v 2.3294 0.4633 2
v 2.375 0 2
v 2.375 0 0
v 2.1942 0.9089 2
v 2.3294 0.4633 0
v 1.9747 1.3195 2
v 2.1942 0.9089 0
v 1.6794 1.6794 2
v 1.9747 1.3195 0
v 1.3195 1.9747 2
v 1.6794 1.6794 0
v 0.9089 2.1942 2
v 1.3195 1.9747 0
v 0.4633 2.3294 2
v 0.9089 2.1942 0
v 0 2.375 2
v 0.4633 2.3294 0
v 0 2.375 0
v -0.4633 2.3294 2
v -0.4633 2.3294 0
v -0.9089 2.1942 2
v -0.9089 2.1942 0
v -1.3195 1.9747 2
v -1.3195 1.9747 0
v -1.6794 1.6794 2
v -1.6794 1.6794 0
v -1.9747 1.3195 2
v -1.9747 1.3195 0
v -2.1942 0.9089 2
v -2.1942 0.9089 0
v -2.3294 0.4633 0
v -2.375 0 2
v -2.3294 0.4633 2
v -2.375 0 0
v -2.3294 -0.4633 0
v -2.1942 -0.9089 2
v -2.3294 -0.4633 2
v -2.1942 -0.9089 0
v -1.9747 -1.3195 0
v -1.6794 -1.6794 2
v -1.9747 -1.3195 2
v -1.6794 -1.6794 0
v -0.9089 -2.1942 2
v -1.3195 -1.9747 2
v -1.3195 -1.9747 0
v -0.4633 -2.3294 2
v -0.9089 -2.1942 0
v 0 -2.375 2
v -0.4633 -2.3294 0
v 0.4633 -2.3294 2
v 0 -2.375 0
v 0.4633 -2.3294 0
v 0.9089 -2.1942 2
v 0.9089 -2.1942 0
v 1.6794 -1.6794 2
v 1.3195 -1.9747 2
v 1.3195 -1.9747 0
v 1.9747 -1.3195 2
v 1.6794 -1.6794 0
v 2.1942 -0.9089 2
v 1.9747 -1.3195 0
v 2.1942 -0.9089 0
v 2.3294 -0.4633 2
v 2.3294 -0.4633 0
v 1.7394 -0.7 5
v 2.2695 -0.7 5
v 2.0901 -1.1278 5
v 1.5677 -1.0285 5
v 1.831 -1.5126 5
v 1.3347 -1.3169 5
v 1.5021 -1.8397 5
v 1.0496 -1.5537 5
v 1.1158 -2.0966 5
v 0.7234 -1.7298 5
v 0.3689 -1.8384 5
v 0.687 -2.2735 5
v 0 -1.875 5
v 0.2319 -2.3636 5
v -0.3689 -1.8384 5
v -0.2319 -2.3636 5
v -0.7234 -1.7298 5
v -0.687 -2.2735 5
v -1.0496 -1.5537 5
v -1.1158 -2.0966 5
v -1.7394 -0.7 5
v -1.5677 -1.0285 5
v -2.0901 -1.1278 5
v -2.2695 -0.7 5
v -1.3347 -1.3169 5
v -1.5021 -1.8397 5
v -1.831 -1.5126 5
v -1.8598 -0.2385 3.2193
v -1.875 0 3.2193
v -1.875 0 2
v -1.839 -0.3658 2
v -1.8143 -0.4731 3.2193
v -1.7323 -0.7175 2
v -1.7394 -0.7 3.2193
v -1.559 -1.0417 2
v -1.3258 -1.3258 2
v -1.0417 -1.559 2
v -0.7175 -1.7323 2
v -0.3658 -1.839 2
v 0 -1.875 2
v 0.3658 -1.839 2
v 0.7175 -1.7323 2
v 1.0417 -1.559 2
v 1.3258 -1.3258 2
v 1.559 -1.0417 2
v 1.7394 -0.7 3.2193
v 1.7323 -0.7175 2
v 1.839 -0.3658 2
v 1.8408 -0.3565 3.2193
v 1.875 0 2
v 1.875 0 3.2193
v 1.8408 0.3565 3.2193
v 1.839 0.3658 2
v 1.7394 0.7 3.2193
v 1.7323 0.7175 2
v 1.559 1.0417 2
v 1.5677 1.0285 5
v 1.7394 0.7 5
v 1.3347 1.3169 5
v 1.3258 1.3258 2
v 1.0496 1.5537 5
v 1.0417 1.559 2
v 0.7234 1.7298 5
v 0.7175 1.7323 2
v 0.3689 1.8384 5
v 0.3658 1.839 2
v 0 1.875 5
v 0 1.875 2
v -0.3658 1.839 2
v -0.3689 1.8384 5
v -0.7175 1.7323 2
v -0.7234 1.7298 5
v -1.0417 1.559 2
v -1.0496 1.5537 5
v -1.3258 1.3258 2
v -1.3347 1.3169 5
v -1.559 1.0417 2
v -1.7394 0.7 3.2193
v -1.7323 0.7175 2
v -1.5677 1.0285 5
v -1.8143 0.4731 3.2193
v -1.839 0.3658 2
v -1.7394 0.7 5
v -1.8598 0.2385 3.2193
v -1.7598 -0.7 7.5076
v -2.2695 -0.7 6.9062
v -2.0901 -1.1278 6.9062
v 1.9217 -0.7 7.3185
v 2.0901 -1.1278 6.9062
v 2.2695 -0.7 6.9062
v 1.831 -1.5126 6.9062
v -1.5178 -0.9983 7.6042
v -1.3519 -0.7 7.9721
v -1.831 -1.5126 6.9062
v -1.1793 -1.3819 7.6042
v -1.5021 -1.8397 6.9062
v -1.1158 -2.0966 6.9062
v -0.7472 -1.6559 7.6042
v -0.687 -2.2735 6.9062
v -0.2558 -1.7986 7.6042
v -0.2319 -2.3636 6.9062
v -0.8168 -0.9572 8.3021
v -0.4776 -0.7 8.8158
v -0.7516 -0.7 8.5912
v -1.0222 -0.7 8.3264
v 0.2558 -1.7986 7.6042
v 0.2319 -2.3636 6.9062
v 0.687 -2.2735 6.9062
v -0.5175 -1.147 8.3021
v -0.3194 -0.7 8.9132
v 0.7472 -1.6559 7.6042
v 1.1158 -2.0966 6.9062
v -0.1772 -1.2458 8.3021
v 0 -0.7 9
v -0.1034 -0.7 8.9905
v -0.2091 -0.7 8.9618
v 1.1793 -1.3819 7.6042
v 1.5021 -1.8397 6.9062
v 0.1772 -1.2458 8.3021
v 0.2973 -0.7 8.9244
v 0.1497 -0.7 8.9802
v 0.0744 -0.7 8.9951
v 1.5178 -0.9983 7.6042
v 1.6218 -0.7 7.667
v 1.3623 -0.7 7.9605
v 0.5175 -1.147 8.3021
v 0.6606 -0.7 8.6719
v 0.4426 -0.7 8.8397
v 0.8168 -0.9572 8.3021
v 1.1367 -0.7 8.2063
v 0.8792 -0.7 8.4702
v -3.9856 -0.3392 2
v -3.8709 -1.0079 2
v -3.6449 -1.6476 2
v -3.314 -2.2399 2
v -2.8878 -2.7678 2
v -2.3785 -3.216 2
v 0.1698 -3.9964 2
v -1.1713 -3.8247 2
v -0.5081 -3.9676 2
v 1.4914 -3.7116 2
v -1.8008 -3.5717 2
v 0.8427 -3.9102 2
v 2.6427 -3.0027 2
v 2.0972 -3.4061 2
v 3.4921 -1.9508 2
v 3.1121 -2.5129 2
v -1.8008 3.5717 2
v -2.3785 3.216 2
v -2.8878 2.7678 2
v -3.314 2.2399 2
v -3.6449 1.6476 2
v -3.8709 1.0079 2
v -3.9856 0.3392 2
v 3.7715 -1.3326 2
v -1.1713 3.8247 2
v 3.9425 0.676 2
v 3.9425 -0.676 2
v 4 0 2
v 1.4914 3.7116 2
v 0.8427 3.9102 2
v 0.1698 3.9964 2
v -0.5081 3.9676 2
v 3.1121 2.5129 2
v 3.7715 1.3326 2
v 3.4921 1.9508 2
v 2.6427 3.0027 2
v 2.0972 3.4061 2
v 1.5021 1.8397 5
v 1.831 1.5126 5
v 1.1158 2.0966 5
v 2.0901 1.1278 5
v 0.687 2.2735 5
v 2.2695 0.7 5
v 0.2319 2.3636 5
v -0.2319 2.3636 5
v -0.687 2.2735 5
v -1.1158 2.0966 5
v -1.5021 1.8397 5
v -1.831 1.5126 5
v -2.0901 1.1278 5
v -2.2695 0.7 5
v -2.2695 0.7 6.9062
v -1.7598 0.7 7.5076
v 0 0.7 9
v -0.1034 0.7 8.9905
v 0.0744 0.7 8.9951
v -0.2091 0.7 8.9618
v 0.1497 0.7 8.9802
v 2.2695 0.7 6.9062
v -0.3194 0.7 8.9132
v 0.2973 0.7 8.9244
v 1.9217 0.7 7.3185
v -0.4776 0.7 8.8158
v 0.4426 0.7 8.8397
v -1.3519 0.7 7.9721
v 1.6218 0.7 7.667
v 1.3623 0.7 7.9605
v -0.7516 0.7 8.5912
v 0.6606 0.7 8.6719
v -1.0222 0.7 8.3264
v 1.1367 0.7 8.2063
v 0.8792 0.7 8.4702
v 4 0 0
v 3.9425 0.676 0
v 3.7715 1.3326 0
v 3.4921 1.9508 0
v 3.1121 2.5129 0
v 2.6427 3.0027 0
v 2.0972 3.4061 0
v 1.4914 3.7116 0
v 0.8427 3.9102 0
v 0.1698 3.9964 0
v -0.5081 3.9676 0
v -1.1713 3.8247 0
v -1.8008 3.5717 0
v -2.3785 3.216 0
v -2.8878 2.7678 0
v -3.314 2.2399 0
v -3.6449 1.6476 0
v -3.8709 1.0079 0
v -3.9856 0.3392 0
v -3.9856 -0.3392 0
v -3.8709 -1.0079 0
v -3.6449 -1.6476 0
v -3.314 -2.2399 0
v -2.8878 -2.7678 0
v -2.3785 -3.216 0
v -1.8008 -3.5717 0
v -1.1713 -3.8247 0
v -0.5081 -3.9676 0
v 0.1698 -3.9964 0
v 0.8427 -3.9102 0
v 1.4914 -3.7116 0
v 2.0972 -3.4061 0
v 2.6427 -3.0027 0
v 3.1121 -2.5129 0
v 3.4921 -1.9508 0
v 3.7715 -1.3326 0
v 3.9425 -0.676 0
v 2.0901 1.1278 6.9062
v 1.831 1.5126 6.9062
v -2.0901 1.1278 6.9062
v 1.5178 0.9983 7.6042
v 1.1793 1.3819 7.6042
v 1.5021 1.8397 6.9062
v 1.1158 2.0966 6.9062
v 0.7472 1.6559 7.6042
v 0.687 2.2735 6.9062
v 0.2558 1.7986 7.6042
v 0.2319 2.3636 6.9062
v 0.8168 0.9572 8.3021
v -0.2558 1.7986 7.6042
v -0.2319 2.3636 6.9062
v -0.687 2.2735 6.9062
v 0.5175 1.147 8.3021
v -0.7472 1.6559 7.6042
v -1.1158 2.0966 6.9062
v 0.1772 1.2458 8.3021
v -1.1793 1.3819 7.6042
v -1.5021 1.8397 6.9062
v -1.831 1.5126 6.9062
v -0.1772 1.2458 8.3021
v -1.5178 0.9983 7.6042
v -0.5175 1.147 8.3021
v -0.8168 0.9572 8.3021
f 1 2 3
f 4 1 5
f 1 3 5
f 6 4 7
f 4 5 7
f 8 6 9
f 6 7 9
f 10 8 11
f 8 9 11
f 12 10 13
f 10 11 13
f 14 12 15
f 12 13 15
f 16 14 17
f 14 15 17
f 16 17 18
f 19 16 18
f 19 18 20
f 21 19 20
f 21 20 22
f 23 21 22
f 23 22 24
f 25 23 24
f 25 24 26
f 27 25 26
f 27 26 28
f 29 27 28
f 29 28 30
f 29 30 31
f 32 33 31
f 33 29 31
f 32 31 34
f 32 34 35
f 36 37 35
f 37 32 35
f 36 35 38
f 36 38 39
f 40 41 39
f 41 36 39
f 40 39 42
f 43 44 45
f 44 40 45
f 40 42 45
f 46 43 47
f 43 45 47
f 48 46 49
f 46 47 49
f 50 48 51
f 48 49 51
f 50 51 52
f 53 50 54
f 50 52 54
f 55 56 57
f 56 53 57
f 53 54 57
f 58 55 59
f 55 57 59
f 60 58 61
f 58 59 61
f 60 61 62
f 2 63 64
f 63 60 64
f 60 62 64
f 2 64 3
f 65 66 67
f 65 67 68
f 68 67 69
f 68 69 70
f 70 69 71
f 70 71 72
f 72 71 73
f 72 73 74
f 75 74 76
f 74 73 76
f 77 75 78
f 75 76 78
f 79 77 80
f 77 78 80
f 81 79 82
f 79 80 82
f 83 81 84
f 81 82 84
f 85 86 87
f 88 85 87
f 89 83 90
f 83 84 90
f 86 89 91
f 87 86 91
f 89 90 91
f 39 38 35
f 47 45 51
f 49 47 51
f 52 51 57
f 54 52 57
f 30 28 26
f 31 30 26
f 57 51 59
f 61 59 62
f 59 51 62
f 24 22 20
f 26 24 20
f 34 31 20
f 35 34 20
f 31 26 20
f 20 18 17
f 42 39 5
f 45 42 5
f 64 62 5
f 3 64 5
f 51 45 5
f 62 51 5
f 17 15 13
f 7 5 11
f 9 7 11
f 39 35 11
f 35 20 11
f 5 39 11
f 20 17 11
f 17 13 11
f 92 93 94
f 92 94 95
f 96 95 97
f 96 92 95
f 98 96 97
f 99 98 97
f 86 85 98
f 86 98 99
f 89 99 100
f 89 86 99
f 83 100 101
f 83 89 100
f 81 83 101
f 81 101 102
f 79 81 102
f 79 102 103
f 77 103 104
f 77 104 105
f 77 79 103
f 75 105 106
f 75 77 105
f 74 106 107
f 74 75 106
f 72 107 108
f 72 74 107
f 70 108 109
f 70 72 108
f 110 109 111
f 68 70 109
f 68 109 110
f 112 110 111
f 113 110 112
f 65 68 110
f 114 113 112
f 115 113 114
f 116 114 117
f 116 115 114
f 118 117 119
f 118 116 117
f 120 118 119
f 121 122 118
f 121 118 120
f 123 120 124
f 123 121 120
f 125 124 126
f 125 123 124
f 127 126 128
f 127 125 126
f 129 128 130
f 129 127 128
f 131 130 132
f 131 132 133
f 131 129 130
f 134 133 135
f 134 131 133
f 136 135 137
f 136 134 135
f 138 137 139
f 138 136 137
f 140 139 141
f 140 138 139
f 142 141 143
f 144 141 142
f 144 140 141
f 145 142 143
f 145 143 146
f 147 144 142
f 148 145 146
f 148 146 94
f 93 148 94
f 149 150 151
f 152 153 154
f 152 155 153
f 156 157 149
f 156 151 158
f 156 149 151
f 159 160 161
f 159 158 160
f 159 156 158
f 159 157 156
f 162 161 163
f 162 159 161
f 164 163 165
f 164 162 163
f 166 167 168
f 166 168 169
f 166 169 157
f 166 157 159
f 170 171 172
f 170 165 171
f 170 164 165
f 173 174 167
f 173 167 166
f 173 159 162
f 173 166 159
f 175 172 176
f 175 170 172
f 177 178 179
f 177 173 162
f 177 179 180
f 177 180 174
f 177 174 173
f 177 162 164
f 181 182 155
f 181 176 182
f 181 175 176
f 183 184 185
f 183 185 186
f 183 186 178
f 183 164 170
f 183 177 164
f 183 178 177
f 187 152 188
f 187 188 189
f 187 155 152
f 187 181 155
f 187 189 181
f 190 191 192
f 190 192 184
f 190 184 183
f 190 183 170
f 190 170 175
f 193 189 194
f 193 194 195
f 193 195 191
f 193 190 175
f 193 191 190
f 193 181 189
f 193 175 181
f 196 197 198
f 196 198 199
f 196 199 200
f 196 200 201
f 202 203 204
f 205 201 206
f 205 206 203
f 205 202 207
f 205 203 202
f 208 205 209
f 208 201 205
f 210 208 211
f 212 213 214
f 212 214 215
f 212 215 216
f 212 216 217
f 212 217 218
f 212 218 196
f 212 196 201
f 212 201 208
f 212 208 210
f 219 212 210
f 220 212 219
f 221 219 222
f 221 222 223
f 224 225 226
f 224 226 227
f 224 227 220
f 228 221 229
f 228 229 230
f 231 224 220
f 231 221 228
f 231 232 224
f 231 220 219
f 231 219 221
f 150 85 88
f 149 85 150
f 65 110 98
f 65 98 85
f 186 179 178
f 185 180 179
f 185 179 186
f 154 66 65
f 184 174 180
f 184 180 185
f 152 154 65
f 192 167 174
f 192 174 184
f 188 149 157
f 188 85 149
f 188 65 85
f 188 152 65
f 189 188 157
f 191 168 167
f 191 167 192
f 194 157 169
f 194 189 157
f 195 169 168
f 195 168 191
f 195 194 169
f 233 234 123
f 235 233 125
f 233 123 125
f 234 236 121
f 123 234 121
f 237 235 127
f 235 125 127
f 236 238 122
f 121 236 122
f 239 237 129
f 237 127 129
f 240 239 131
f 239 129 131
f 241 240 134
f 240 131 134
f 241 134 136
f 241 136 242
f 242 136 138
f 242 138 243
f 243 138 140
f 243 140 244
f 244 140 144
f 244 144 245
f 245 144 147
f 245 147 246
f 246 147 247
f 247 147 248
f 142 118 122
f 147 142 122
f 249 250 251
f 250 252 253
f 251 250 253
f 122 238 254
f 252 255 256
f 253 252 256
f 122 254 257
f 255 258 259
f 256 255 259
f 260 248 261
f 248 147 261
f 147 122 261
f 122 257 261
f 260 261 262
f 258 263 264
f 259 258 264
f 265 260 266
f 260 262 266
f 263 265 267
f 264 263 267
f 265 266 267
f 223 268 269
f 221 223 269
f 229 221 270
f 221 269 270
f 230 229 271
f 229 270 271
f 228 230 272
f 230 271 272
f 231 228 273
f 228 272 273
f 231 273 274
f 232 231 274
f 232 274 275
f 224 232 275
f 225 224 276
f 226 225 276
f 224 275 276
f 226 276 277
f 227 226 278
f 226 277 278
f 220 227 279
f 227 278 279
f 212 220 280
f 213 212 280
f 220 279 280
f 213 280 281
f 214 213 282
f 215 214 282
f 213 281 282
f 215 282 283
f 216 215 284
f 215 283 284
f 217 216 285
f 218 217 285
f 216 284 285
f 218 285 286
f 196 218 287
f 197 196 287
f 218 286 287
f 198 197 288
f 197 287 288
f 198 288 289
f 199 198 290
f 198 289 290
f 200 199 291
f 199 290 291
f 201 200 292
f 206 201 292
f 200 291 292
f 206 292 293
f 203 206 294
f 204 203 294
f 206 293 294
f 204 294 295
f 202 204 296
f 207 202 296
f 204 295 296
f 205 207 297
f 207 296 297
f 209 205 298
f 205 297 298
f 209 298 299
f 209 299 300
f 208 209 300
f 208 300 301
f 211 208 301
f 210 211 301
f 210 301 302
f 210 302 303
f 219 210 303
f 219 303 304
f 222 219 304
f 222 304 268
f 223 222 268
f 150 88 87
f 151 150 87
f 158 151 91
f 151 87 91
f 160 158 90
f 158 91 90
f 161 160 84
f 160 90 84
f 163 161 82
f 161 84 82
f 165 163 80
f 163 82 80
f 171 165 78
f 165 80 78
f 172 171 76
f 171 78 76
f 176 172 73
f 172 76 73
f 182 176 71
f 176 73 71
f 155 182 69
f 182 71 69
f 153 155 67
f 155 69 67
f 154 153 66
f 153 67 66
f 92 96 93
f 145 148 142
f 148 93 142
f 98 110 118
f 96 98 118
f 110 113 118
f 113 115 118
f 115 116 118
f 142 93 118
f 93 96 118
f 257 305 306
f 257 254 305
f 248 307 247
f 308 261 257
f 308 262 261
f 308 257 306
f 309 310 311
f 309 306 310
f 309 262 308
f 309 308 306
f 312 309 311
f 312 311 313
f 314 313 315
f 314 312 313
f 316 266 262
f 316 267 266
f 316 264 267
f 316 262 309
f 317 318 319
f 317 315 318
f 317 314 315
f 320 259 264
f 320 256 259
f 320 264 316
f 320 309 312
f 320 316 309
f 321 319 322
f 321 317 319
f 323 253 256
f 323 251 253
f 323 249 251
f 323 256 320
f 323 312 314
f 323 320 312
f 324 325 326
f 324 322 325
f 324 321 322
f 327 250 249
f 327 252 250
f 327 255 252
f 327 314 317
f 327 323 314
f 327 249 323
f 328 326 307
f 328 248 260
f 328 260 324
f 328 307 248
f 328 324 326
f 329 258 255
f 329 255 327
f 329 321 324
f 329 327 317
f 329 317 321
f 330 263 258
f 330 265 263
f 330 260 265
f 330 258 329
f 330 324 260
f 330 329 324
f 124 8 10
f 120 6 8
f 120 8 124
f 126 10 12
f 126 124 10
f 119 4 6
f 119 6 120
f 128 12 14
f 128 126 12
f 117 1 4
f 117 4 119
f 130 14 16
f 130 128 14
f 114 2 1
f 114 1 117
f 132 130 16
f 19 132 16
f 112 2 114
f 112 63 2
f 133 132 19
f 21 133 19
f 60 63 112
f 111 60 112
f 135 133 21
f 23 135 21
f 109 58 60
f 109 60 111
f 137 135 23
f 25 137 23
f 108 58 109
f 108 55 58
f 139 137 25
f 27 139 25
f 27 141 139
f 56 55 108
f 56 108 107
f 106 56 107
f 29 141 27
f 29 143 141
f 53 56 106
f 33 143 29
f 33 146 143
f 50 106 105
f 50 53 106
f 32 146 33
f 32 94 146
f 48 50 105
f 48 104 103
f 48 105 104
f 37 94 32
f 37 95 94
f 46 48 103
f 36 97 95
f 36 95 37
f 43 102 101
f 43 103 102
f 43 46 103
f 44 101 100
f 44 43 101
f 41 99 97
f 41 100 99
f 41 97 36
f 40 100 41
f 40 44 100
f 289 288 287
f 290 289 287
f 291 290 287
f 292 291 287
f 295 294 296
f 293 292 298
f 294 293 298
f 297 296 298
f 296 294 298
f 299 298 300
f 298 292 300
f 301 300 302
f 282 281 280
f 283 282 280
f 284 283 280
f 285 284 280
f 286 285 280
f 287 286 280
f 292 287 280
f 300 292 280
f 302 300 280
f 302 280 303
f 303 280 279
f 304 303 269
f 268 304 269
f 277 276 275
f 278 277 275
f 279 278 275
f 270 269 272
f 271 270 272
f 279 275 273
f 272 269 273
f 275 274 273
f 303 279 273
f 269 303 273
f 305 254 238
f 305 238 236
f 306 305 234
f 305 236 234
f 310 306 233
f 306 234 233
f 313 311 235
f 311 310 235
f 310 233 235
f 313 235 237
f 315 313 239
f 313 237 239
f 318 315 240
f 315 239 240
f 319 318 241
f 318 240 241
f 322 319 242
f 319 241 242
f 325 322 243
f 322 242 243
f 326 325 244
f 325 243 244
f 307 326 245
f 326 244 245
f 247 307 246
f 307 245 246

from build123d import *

# Parameters (mm, degrees)
F0_R      = 4
F1_DEPTH  = 2
F2_R      = 2.375
F3_DEPTH  = 9
F4_W      = 2
F4_H      = 3
F10_W     = 1.4
F10_H     = 6.5
F11_DEPTH = 2.5


with BuildPart() as f1:
    # F0 (on Top) → F1 (new body)
    with BuildSketch(Plane.XY):
        Circle(F0_R)
    extrude(amount=F1_DEPTH)


with BuildPart() as f3:
    # F2 (on Top) → F3 (new body)
    with BuildSketch(Plane.XY):
        Circle(F2_R)
    extrude(amount=F3_DEPTH)

    # F4 (on Front) → F6 (revolve, cut)
    with BuildSketch(Plane.XZ):
        with Locations((-2.875, 3.5)):
            Rectangle(F4_W, F4_H)
    revolve(axis=Axis((0, 0, 5.832826), (0, 0, 1)), mode=Mode.SUBTRACT)

    # F7 (on Front) → F9 (revolve, cut)
    with BuildSketch(Plane.XZ):
        Polygon((-2.5, 6.75), (-0.5, 9.25), (-2.5, 9.25), align=None)
    revolve(axis=Axis((0, 0, 4.448059), (0, 0, 1)), mode=Mode.SUBTRACT)

    # F10 (on Right) → F11 (cut, symmetric)
    with BuildSketch(Plane.YZ):
        with Locations((0, 6.469328)):
            Rectangle(F10_W, F10_H)
    extrude(amount=F11_DEPTH, both=True, mode=Mode.SUBTRACT)


solid = Compound([f1.part, f3.part])
